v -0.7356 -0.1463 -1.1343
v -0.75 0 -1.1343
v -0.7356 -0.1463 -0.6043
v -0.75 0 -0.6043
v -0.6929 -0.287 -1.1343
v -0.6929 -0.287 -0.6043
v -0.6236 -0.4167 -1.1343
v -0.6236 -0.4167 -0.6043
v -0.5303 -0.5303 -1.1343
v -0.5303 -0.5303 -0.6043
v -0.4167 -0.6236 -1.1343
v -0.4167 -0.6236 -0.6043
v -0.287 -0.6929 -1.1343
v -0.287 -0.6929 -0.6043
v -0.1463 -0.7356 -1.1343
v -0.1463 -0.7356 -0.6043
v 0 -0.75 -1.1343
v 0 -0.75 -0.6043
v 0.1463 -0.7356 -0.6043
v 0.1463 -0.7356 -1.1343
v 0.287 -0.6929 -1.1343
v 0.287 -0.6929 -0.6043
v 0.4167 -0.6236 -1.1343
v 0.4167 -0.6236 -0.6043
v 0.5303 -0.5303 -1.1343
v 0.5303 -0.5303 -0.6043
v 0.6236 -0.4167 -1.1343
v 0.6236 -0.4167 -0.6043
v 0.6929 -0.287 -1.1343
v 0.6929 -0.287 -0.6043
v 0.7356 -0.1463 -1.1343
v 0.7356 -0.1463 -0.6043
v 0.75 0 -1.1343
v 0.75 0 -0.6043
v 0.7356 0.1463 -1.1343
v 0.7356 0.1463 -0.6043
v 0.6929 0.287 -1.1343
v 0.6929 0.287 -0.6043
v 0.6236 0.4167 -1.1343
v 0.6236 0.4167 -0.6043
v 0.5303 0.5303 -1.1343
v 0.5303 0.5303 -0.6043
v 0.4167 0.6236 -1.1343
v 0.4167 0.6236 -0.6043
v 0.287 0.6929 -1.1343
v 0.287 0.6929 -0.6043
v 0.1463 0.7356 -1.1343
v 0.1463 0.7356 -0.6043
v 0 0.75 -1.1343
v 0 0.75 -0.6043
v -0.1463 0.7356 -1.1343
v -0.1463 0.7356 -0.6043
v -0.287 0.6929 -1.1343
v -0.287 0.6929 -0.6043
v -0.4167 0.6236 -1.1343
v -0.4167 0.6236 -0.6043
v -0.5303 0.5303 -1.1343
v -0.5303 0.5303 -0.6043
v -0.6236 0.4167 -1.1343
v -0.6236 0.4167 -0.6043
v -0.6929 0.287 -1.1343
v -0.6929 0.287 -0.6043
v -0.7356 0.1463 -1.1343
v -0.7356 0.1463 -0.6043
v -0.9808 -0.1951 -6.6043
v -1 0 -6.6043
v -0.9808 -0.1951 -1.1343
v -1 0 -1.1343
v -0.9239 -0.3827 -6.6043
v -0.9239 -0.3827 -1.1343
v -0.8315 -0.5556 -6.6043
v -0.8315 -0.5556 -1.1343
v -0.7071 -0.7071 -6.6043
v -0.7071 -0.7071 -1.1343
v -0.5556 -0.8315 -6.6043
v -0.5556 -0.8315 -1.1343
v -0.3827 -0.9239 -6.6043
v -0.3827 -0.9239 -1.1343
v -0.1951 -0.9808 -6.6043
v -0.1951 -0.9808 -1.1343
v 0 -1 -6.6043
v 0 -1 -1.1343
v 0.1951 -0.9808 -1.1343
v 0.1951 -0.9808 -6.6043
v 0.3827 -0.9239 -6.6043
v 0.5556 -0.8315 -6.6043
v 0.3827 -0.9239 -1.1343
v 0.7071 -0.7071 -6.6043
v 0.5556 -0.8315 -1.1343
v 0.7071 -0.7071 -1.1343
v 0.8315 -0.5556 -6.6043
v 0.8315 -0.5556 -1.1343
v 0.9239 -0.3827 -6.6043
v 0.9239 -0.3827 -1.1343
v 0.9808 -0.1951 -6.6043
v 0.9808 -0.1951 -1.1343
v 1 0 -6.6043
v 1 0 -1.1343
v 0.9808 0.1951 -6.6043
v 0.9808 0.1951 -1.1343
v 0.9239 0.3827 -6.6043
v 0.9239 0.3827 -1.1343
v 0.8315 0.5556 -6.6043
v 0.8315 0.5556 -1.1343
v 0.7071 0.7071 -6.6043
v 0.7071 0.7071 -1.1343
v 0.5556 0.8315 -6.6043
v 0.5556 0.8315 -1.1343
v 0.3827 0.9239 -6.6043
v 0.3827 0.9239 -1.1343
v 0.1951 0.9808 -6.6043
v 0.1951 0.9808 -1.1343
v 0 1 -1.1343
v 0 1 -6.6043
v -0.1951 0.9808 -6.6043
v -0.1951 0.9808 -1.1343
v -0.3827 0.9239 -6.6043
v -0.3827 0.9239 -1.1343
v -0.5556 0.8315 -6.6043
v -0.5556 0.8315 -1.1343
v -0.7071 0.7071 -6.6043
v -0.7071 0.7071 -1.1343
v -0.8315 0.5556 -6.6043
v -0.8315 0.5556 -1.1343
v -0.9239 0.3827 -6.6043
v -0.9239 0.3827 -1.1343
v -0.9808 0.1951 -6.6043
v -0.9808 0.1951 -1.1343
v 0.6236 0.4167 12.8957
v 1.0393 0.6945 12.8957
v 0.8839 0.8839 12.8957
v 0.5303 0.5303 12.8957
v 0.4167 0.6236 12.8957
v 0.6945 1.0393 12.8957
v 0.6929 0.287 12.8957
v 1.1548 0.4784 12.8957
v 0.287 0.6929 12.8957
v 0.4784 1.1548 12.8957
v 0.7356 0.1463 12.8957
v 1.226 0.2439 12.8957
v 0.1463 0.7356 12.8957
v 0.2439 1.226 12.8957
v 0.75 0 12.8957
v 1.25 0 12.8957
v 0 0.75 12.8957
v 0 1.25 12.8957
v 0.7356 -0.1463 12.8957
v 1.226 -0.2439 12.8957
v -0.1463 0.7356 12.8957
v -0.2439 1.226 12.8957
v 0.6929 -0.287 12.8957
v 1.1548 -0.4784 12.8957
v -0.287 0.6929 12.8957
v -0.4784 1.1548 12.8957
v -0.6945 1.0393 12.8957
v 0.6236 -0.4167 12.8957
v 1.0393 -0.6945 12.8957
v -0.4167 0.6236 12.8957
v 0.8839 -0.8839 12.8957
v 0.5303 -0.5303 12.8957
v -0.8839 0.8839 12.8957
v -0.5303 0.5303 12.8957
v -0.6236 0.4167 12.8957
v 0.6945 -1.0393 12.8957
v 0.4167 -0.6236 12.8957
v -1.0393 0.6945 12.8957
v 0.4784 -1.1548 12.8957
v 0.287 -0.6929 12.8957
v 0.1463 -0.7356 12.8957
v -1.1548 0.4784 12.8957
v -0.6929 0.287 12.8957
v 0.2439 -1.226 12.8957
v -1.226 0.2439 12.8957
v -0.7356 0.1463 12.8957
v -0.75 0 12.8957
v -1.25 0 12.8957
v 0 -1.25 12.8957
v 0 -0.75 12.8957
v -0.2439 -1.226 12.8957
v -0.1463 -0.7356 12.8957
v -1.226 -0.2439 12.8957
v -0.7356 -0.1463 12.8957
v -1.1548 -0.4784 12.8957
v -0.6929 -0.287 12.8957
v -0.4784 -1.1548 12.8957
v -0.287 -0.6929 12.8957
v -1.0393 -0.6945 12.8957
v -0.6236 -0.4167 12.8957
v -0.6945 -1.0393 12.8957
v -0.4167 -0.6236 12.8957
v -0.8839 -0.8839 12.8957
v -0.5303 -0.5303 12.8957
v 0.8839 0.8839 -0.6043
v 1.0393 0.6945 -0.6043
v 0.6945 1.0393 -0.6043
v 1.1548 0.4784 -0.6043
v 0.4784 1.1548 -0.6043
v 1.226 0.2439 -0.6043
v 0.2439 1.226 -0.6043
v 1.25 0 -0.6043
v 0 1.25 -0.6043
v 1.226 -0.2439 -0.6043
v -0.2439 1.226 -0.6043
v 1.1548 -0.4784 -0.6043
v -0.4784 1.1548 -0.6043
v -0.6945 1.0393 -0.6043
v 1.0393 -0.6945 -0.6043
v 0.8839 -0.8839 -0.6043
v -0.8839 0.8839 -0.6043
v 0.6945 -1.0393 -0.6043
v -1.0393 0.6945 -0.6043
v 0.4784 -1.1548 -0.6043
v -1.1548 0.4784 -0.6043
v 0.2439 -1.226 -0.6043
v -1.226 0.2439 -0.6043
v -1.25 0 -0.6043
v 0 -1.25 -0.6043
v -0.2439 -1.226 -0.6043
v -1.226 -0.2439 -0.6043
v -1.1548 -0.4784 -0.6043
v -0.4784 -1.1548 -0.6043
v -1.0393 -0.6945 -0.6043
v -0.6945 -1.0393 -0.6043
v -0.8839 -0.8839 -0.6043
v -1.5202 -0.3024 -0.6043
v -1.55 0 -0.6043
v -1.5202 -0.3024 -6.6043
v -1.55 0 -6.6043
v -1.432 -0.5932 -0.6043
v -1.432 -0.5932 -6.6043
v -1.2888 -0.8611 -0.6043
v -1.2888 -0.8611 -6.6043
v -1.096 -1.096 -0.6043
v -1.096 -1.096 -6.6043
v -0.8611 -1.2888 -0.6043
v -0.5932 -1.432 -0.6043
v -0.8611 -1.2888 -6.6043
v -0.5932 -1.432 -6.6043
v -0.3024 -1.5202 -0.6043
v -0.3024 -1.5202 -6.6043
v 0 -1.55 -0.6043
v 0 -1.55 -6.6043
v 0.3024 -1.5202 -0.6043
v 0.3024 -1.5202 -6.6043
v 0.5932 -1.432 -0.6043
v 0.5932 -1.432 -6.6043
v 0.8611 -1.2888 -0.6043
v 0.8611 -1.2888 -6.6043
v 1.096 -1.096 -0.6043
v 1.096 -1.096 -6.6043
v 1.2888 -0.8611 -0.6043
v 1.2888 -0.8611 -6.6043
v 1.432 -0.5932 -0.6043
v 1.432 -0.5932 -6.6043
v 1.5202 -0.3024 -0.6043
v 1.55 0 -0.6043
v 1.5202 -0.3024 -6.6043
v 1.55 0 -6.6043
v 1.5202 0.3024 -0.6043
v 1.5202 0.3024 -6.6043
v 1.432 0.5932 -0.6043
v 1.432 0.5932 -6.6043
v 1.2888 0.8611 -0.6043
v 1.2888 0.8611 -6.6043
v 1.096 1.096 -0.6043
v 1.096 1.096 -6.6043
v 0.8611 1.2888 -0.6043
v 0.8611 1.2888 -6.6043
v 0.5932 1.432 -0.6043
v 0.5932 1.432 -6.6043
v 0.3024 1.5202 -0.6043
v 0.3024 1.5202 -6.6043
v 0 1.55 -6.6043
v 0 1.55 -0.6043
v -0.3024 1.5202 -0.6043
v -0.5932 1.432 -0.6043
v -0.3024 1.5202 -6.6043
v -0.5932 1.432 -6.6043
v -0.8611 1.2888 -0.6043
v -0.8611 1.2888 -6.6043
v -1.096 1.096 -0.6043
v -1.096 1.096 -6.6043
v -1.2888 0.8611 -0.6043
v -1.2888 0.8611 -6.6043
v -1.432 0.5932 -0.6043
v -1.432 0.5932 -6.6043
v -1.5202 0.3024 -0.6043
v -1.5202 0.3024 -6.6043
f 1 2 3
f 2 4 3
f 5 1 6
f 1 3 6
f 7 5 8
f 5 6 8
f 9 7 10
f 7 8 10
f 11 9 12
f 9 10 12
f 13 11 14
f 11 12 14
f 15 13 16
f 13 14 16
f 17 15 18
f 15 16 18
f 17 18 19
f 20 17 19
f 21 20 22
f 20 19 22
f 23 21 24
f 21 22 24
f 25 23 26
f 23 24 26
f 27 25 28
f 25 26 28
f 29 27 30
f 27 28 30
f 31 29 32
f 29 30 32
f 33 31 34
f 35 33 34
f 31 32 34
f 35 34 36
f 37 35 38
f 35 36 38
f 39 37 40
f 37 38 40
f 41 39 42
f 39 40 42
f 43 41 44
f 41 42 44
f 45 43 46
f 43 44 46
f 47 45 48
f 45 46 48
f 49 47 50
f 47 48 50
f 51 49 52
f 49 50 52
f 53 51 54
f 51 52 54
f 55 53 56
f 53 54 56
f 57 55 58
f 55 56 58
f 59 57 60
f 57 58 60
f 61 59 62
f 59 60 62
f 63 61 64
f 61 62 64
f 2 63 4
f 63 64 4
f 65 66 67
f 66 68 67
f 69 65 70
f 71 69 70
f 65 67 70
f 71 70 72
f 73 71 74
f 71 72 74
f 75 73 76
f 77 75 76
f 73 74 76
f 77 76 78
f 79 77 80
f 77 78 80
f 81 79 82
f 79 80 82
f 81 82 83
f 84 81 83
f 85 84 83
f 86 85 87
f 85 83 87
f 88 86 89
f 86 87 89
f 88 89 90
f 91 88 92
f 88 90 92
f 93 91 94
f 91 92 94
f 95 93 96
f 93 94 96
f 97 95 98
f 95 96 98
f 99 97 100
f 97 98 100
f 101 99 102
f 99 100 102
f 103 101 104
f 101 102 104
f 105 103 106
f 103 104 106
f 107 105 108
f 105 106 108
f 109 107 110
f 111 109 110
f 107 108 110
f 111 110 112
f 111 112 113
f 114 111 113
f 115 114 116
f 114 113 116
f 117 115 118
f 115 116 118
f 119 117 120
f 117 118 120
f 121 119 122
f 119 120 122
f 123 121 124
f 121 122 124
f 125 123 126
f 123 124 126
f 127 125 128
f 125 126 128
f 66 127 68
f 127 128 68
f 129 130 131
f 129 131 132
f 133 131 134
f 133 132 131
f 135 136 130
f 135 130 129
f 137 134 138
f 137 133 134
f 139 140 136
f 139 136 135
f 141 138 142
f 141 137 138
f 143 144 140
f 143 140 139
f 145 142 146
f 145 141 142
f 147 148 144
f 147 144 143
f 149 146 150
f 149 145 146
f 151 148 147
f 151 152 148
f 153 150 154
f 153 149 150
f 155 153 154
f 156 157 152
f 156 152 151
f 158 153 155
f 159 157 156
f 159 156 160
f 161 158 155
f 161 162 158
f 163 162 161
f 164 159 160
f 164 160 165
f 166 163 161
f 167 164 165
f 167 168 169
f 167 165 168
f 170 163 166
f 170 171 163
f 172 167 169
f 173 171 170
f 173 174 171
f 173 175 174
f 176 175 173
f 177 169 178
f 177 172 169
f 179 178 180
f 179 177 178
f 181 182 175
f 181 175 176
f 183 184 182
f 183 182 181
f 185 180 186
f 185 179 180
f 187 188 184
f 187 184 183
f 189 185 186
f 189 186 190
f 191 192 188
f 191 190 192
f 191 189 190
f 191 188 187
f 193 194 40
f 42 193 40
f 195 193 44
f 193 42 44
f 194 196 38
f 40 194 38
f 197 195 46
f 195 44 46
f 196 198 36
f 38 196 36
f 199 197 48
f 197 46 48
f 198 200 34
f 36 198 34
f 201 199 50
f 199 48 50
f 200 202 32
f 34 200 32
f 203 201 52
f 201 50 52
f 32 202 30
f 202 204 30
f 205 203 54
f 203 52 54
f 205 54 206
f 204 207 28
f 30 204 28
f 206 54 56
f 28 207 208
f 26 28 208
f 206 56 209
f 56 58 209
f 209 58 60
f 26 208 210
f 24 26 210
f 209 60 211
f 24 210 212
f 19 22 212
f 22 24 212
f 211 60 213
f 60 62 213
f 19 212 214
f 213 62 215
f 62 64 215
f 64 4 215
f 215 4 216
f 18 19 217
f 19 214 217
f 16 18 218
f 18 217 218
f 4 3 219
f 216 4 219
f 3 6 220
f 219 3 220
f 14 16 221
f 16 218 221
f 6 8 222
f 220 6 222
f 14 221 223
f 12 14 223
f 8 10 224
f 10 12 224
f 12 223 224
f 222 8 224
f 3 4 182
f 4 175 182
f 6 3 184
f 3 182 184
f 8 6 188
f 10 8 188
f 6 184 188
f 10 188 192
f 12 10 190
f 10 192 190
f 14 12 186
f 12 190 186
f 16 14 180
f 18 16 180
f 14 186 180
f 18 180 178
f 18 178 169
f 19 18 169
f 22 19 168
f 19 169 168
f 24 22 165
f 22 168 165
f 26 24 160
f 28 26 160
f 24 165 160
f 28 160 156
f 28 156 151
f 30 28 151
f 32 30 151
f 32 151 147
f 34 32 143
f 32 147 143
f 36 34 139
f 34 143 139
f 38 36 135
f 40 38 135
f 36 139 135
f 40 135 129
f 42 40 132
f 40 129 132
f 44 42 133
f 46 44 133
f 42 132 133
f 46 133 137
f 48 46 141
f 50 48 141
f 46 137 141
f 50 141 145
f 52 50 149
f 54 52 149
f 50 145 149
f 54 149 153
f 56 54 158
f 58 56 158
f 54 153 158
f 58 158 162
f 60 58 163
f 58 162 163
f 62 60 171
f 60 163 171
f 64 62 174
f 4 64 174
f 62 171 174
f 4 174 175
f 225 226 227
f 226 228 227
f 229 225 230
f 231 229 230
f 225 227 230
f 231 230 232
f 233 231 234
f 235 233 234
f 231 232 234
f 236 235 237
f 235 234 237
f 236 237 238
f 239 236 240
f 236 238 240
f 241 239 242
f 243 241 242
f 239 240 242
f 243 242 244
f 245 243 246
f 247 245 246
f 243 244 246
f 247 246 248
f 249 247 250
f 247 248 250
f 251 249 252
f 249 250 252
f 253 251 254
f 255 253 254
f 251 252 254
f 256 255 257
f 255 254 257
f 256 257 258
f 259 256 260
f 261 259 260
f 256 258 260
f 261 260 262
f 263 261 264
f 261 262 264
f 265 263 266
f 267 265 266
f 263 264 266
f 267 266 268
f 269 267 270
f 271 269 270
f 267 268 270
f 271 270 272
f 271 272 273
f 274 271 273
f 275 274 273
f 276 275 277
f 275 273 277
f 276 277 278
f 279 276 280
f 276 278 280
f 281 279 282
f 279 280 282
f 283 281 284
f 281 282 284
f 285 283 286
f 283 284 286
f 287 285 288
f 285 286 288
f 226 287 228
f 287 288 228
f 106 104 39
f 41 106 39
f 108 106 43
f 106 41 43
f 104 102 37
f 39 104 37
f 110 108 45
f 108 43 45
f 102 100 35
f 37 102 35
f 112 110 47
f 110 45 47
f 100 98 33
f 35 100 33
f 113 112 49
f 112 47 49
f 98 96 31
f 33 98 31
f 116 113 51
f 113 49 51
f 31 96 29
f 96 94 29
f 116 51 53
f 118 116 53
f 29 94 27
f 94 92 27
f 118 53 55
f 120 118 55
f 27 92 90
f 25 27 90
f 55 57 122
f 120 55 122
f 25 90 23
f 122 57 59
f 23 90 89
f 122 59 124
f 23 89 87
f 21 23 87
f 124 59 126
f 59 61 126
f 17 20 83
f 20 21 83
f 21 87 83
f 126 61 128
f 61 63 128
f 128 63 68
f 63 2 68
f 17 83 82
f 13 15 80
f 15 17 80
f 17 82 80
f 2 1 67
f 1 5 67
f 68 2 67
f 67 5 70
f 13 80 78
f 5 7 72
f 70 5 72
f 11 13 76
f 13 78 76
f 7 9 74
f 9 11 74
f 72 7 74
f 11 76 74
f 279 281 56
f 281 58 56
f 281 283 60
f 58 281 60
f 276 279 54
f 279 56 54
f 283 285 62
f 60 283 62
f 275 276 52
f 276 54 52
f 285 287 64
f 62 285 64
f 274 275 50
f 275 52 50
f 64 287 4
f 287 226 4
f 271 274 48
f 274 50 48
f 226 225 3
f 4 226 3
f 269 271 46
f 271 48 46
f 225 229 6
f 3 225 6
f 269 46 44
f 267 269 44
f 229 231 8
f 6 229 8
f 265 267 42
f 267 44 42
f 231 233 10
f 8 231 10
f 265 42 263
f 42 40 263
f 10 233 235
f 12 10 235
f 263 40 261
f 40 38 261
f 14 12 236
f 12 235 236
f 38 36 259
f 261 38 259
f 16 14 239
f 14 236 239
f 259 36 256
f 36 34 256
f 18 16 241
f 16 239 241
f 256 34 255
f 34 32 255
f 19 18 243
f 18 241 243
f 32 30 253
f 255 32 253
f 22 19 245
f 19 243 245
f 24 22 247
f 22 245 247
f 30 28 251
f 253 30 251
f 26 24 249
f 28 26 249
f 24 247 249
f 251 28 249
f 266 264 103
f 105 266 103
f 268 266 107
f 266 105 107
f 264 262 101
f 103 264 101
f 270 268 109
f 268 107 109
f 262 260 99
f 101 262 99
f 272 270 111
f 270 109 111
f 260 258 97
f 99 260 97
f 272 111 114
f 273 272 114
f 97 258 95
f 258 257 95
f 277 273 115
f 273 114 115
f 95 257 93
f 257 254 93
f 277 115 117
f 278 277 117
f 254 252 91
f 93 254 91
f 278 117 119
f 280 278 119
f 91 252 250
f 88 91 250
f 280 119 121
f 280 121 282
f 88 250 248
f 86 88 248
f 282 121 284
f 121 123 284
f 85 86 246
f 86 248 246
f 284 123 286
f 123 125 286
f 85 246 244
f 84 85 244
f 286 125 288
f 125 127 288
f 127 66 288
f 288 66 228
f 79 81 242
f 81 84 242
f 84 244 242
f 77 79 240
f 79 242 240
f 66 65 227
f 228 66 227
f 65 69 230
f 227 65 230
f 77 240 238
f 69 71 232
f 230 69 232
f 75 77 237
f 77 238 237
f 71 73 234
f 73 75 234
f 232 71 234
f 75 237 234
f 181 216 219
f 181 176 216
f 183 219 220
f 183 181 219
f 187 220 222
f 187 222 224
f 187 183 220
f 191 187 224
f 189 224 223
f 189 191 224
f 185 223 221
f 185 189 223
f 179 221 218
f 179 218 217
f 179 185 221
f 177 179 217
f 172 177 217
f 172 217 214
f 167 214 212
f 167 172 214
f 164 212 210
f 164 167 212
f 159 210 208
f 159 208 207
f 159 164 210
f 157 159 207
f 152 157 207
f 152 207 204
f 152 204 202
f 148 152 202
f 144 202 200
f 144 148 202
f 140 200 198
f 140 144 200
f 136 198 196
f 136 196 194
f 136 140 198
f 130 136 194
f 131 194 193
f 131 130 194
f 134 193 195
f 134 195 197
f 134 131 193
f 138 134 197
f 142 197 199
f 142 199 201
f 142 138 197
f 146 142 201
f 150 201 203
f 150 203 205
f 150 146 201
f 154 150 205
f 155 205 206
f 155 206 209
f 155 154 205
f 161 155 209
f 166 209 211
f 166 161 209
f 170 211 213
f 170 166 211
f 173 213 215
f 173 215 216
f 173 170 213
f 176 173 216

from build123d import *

# Parameters (mm, degrees)
F0_W = 0.5
F0_H = 13.5


with BuildPart() as f1:
    # F0 (on Front) → F1 (revolve)
    with BuildSketch(Plane.XZ):
        Polygon((-1.55, -6.604333), (-1, -6.604333), (-1, -1.134333), (-0.75, -1.134333), (-0.75, -0.604333), (-1.25, -0.604333), (-1.55, -0.604333), align=None)
    revolve(axis=Axis((0, 0, -3.604333), (0, 0, 1)))


with BuildPart() as f2:
    # F0 (on Front) → F2 (revolve)
    with BuildSketch(Plane.XZ):
        with Locations((-1, 6.145667)):
            Rectangle(F0_W, F0_H)
    revolve(axis=Axis((0, 0, 6.145667), (0, 0, 1)))


solid = Compound([f1.part, f2.part])
